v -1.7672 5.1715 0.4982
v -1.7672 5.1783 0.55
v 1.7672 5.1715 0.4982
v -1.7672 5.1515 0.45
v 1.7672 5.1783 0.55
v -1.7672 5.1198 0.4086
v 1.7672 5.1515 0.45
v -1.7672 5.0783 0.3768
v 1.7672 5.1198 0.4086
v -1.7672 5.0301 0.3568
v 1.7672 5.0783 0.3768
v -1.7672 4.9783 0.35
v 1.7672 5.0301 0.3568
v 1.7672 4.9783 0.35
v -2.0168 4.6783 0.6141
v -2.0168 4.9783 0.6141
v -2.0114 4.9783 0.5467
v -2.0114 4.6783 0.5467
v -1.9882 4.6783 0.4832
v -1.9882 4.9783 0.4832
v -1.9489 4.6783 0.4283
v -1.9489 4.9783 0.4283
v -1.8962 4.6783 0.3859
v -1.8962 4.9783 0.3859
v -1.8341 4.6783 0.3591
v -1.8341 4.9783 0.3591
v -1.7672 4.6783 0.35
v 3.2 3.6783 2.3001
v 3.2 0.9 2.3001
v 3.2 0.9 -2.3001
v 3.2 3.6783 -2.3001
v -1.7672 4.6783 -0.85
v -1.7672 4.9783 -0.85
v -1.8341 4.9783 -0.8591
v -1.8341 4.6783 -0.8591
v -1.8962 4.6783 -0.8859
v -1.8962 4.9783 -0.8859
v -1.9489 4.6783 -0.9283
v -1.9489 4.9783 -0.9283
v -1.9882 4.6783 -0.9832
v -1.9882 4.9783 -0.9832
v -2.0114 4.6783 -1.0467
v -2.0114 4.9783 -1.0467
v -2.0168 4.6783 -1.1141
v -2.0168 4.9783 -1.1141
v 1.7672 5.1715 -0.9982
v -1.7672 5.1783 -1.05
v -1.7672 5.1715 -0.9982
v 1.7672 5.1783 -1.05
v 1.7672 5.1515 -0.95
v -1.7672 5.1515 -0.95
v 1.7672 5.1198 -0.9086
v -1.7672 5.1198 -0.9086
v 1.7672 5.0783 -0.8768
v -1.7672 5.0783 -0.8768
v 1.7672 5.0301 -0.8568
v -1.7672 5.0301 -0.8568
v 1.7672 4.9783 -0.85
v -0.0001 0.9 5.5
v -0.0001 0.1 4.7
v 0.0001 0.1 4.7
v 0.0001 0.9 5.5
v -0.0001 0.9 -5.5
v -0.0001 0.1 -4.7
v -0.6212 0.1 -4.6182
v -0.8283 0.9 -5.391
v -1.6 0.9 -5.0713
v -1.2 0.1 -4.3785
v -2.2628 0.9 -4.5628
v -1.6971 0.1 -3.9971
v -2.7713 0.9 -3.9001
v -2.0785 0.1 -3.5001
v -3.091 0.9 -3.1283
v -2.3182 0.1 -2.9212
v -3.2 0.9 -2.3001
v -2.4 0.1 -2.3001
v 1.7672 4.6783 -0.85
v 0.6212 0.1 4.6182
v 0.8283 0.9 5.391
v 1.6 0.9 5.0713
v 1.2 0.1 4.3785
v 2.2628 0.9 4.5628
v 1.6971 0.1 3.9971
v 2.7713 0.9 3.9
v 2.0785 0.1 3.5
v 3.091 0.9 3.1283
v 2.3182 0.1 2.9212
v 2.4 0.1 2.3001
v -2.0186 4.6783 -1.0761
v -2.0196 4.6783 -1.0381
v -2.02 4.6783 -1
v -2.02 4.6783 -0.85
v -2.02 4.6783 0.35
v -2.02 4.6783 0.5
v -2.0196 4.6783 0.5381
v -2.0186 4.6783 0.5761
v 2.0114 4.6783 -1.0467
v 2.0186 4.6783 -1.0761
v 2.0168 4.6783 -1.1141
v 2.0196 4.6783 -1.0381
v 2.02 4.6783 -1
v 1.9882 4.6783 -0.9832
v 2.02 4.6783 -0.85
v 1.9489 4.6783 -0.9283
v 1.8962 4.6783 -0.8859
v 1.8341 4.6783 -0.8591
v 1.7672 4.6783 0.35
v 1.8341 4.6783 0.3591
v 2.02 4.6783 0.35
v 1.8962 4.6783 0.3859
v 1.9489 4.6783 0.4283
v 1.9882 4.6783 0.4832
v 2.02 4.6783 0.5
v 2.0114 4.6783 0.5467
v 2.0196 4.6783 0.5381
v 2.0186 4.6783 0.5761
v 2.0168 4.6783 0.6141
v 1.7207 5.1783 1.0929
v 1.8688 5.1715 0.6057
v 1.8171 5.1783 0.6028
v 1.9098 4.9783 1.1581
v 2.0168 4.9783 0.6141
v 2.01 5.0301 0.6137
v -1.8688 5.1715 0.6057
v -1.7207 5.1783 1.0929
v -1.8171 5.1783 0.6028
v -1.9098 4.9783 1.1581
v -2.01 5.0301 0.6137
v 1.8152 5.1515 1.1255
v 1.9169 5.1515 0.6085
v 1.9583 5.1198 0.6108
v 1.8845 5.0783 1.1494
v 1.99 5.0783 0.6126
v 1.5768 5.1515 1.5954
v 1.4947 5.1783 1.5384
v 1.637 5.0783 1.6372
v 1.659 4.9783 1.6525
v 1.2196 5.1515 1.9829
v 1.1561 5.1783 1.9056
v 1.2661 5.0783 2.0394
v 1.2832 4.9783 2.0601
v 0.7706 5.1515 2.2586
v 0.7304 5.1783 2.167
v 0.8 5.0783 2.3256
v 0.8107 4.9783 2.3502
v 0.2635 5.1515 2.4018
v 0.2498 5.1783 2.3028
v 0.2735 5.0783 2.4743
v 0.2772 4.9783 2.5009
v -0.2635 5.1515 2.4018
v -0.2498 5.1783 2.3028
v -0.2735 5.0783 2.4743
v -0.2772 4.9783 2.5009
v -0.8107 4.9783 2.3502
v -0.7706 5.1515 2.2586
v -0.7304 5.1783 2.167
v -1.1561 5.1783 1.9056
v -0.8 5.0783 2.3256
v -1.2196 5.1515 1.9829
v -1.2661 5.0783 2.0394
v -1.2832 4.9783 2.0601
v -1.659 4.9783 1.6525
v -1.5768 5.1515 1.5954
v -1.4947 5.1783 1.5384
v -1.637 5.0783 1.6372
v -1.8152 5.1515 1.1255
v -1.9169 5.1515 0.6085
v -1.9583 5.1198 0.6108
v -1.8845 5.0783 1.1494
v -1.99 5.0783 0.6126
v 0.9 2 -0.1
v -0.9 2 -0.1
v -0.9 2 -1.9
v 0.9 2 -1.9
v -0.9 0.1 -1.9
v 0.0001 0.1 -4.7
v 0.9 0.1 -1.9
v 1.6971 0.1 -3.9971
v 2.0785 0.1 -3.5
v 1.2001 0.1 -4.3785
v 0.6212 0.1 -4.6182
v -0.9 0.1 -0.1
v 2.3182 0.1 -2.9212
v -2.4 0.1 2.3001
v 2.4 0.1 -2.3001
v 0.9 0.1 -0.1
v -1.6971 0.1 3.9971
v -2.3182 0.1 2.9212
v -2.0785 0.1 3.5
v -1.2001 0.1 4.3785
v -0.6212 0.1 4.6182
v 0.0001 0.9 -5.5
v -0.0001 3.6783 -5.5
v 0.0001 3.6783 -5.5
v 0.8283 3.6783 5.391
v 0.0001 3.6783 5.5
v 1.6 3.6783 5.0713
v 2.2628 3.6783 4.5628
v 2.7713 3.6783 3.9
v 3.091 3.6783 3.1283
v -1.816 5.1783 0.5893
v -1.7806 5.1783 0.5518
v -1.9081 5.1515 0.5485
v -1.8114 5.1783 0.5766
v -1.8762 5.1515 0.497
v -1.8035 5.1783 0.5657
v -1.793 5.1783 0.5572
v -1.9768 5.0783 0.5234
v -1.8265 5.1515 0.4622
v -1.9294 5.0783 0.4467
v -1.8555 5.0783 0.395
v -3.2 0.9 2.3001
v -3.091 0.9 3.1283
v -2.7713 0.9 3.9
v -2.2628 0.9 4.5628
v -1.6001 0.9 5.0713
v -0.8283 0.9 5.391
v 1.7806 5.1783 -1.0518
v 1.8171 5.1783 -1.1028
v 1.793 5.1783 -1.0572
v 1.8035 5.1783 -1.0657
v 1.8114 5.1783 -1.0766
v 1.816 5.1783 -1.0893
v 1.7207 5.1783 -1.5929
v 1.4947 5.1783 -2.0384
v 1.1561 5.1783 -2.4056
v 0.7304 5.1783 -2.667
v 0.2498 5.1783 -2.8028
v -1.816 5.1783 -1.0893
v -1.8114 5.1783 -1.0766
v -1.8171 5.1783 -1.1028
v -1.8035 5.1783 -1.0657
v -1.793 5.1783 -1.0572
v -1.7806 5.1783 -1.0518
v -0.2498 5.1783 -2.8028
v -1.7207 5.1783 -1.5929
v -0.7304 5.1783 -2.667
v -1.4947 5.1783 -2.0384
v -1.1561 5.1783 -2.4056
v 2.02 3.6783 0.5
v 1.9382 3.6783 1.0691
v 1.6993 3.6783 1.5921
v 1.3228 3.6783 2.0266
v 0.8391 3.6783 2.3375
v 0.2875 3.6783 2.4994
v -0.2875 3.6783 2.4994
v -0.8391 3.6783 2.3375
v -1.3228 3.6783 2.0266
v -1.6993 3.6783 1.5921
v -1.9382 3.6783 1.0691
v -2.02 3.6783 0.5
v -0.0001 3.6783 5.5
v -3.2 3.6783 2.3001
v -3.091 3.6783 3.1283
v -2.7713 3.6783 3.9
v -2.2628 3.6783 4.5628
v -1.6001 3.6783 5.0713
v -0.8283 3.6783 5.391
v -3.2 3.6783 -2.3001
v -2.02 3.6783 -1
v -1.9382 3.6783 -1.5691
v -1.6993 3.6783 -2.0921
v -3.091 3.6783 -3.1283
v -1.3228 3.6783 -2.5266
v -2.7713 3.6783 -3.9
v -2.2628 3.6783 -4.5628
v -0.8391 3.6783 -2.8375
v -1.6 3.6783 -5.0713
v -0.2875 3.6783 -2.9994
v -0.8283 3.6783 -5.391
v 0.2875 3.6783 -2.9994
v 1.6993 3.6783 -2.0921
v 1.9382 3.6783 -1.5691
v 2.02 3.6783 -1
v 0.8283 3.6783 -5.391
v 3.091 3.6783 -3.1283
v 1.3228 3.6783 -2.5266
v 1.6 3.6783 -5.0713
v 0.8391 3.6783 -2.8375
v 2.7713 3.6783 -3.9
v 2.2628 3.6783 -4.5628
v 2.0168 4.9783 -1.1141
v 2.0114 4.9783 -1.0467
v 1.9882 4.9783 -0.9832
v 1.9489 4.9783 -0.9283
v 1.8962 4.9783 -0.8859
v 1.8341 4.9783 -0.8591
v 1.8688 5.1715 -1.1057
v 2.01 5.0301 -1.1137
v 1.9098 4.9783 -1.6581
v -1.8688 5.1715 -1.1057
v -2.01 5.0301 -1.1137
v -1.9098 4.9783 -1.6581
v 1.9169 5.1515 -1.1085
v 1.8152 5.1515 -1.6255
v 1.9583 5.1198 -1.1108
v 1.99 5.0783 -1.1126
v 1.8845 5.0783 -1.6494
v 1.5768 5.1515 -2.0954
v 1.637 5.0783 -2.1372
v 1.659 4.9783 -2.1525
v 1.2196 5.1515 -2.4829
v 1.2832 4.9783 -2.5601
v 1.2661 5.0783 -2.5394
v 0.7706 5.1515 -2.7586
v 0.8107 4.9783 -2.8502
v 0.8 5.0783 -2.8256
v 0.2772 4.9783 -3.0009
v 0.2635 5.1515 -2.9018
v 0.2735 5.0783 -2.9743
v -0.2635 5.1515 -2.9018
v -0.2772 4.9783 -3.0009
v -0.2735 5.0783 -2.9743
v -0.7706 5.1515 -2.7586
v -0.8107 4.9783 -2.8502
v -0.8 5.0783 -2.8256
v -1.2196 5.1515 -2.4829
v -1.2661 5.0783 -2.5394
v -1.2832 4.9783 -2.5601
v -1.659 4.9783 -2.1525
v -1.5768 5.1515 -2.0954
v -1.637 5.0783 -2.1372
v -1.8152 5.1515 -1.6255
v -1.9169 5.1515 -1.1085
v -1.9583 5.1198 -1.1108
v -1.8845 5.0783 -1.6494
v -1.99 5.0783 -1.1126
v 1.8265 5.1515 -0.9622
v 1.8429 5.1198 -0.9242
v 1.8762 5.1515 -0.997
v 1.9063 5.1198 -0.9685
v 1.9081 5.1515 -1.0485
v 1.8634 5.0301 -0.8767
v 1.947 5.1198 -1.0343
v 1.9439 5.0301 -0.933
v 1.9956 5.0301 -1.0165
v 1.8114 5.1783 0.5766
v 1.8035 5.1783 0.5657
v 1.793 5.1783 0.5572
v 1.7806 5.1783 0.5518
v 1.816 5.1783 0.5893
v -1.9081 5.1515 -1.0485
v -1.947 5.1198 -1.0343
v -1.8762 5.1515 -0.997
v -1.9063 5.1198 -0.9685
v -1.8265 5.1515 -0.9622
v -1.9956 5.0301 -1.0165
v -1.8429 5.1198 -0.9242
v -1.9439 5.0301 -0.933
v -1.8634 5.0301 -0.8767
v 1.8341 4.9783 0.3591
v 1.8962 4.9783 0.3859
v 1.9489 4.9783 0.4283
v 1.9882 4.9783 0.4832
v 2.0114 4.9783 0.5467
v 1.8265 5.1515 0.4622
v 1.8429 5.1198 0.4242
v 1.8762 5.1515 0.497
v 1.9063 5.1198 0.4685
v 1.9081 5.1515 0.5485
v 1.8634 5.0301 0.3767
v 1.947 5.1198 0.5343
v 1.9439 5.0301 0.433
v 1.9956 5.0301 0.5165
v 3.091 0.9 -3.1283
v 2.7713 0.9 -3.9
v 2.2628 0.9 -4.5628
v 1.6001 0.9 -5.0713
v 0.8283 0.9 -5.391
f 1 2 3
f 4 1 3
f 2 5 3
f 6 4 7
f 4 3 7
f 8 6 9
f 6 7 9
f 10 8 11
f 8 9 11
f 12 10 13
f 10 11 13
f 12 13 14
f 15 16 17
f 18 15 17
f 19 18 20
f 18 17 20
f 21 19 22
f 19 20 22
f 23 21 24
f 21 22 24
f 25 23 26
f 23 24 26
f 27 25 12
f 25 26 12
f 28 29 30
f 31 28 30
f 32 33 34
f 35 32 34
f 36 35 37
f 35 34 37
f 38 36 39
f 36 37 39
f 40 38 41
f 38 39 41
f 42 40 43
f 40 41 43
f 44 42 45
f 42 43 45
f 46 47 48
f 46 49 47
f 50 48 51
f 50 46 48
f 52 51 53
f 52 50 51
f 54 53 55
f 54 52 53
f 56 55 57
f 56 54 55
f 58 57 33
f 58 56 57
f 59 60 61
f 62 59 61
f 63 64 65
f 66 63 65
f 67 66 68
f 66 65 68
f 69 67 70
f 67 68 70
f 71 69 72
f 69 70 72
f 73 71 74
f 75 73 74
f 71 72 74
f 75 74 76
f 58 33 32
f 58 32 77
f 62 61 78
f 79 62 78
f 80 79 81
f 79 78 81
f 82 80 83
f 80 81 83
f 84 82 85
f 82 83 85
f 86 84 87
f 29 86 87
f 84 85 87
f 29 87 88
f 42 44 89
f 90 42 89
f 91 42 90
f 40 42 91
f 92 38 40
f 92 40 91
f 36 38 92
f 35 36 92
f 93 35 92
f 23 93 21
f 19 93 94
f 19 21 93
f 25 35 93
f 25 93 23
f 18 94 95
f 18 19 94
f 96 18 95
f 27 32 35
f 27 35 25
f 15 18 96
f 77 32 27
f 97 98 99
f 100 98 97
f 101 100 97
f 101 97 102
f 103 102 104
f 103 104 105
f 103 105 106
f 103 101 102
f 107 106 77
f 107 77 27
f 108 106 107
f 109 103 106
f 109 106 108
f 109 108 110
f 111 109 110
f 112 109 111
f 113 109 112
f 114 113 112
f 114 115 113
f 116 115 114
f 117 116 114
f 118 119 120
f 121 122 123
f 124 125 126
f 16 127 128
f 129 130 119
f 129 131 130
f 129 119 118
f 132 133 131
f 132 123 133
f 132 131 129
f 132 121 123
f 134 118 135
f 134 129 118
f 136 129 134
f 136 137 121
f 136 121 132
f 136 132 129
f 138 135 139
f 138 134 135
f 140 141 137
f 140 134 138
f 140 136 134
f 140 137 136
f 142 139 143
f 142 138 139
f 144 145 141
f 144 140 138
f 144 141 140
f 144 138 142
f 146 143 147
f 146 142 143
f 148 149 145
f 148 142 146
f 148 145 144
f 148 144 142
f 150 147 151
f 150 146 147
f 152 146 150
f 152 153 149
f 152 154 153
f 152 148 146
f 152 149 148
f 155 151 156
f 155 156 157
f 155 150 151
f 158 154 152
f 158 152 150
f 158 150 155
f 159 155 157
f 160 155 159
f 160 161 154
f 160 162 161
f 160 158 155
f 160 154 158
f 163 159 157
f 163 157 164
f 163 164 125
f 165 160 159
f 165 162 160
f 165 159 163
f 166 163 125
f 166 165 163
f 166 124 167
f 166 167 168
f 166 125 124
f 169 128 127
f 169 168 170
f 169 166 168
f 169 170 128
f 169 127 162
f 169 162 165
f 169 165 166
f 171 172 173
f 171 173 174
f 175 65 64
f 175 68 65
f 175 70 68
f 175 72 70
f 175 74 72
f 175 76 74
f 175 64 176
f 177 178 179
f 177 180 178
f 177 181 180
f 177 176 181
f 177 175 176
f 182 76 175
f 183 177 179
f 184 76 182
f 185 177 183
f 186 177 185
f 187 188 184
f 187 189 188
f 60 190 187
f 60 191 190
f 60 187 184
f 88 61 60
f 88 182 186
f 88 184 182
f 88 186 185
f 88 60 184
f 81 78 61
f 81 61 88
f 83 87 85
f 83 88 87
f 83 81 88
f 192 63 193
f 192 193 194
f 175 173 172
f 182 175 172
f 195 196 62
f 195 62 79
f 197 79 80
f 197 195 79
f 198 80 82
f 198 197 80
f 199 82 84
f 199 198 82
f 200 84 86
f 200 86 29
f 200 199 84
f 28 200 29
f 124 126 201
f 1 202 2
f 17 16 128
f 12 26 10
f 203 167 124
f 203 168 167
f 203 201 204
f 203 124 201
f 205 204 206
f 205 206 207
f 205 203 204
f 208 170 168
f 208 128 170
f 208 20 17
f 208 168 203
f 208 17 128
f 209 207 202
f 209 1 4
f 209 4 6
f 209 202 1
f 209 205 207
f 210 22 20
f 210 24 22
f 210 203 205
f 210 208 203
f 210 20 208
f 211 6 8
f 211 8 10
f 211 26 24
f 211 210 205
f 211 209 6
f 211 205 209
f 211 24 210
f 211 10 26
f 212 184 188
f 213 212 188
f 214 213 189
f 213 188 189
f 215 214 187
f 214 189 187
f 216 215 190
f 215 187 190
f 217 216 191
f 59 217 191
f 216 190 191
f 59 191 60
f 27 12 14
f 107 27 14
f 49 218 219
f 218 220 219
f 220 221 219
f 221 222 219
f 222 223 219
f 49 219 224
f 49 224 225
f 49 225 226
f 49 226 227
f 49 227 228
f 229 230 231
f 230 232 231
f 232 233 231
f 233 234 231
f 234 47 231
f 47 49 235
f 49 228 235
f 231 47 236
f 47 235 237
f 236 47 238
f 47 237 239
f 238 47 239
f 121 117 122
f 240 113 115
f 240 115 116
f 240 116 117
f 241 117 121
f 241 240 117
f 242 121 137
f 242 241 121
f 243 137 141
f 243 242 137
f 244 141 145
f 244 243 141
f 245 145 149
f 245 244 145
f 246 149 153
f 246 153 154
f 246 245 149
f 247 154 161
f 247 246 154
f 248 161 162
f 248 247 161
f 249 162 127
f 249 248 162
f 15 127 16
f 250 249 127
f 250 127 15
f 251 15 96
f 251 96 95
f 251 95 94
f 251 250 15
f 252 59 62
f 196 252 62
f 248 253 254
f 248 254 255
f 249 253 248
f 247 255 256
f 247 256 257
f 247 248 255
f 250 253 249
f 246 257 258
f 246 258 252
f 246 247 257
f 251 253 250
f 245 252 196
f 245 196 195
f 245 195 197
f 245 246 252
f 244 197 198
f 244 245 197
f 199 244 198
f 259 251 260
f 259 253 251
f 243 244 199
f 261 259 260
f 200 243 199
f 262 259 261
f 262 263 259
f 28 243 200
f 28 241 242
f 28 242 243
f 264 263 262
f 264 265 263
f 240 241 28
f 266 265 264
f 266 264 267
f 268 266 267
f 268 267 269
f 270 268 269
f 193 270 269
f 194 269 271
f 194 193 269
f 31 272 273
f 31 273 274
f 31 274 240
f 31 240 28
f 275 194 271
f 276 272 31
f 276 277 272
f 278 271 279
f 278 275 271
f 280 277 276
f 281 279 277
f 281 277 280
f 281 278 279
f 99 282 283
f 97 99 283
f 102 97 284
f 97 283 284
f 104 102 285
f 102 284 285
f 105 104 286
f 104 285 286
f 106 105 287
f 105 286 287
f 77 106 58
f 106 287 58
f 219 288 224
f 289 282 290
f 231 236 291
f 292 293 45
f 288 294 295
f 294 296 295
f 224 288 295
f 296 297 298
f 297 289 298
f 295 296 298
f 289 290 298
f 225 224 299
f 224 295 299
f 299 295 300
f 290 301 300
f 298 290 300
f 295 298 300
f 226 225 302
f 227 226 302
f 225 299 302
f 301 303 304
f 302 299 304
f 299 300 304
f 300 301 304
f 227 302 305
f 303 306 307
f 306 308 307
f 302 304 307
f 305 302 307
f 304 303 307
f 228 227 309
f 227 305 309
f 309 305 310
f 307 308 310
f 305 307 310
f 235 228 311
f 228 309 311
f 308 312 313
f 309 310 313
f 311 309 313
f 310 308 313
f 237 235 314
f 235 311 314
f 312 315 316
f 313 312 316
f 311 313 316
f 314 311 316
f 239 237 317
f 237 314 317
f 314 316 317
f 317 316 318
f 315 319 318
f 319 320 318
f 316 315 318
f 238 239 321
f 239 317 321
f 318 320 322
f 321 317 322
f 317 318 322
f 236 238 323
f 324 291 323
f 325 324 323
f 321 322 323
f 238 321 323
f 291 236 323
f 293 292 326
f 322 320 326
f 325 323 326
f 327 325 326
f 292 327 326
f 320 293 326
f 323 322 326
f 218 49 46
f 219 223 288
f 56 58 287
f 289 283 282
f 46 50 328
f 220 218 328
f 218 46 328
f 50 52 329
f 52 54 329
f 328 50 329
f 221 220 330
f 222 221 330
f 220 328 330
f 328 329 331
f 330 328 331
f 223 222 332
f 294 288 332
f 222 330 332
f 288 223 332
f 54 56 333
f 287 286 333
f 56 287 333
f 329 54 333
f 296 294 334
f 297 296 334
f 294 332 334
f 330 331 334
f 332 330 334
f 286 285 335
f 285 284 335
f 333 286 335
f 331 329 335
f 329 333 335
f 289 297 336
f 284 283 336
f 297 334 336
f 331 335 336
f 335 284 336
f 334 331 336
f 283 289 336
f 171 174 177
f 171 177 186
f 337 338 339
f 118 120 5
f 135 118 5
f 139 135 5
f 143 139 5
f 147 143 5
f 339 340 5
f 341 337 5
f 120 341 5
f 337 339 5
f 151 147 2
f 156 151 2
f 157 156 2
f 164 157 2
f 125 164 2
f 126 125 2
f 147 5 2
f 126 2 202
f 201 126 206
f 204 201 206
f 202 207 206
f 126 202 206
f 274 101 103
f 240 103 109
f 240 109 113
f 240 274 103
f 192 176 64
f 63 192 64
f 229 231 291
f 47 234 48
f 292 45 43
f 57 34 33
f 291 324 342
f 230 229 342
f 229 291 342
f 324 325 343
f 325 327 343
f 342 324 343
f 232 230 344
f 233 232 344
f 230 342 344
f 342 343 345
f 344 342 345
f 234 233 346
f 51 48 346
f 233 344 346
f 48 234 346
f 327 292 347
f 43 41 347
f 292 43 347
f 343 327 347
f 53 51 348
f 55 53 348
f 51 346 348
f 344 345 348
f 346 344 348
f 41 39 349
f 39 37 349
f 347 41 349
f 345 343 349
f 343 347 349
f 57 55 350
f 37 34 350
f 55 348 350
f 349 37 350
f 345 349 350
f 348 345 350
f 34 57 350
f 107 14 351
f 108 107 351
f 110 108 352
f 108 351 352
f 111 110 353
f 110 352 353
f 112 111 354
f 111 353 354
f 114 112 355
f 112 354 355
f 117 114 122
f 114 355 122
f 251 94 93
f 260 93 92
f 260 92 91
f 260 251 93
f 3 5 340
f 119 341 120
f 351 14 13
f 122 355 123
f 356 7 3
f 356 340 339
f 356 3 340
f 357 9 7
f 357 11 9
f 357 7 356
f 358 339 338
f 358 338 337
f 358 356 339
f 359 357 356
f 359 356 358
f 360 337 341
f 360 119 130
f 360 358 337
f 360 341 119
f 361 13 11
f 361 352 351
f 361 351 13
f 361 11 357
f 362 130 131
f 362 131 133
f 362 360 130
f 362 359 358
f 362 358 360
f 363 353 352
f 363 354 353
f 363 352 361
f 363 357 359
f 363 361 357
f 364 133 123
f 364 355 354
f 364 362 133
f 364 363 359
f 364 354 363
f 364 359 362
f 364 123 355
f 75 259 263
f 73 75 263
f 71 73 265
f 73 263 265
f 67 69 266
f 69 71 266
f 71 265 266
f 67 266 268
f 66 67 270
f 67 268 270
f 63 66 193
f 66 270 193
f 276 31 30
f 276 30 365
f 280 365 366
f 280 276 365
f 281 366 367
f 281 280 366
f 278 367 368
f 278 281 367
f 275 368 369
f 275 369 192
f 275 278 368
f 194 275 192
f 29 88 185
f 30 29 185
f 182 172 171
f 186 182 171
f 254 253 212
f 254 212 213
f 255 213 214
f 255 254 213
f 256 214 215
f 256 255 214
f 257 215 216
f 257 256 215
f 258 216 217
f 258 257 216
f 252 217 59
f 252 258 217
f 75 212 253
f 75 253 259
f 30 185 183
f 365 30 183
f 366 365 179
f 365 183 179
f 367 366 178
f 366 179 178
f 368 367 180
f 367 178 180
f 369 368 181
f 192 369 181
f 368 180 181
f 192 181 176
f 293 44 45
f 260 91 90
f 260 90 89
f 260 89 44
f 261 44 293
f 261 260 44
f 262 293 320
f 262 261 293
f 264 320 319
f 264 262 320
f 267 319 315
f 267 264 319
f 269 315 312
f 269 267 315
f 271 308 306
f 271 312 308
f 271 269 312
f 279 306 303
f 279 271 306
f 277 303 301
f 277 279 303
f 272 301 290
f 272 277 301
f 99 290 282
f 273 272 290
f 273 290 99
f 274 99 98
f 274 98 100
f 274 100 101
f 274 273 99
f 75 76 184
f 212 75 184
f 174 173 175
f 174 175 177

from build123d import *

# Parameters (mm, degrees)
SKETCH_1_W              = 6.4
SKETCH_1_H              = 11
EXTRUDE_1_DEPTH         = 3.678333878
FILLET_1_R              = 3.2
EXTRUDE_2_DEPTH         = 1.5
SKETCH_3_W              = 4.04000003
SKETCH_3_H              = 1.2
CUT_EXTRUDE_1_DEPTH     = 0.5
FILLET_2_R              = 0.25
FILLET_3_R              = 0.2
OTHER_2_OUTLINE_W       = 1.5
OTHER_2_OUTLINE_H       = 1.5
OTHER_2_DEPTH           = 2
SKETCH_5_W              = 1.8
SKETCH_5_H              = 1.8
CUT_EXTRUDE_2_DEPTH     = 5.4
CUT_EXTRUDE_START       = -0.1
CUT_EXTRUDE_3_OUTLINE_W = 10
CUT_EXTRUDE_3_OUTLINE_H = 14
CUT_EXTRUDE_3_DEPTH     = 0.1
CHAMFER_1_SIZE          = 0.8


# Read off the part's stored shape, not the designer's step: 压凹2, 切除-拉伸3
# Some blends are built 0.0001 mm under size
with BuildPart() as part:
    # 草图1 → 凸台-拉伸1 (new body)
    with BuildSketch(Plane(origin=(0, 0, 0), x_dir=(1, 0, 0), z_dir=(0, 1, 0))):
        Rectangle(SKETCH_1_W, SKETCH_1_H)
    extrude(amount=EXTRUDE_1_DEPTH)

    # 圆角1
    fillet_1_edges = [part.edges().sort_by_distance(p)[0] for p in [
        (-3.2, 1.839166939, -5.5),
        (3.2, 1.839166939, -5.5),
        (3.2, 1.839166939, 5.5),
        (-3.2, 1.839166939, 5.5),
    ]]
    fillet(fillet_1_edges, radius=FILLET_1_R - 0.0001)  # a hair under: the kernel refuses the full size

    # 草图2 → 凸台-拉伸2 (add)
    with BuildSketch(Plane(origin=(0, 3.678333878, 0), x_dir=(1, 0, 0), z_dir=(0, 1, 0))):
        with BuildLine():
            Line((2.020000015, 1), (2.020000015, -0.5))
            ThreePointArc((2.020000015, -0.5), (0, -2.520000015), (-2.020000015, -0.5))
            Line((-2.020000015, -0.5), (-2.020000015, 1))
            ThreePointArc((-2.020000015, 1), (1.5e-08, 3.02), (2.020000015, 1))
        make_face()
    extrude(amount=EXTRUDE_2_DEPTH)

    # 草图3 → 切除-拉伸1 (cut)
    with BuildSketch(Plane(origin=(0, 5.178333878, 0), x_dir=(1, 0, 0), z_dir=(0, 1, 0))):
        with Locations((0, 0.25)):
            Rectangle(SKETCH_3_W, SKETCH_3_H)
    extrude(amount=-CUT_EXTRUDE_1_DEPTH, mode=Mode.SUBTRACT)

    # 圆角2
    # the kernel refuses this fillet: 0.25 mm, written as the material it takes off along each edge
    with BuildSketch(Plane(origin=(2.020000015, 5.838693877, 0.35), x_dir=(-0.012214651008913897, 0, 0.9999253983676635), z_dir=(0, -1, 0))) as fillet_2_piece_1:
        with BuildLine():
            CenterArc((0.253069545, 0.249754592), FILLET_2_R, 179.300134646, 93.238774214)
            Line((0.003088195, 0.252808255), (-0.02190994, 0.253113621))
            Line((-0.02190994, 0.253113621), (-0.024998135, 0.000305366))
            Line((-0.024998135, 0.000305366), (-0.000305366, -0.024998135))
            ThreePointArc((-0.000305366, -0.024998135), (0.149683443, -0.026830333), (0.265251445, -0.024975459))
            Line((0.265251445, -0.024975459), (0.264143999, 0))
        make_face()
    extrude(amount=1.160359998, mode=Mode.SUBTRACT)
    with BuildSketch(Plane(origin=(2.020000015, 5.838693882, -0.85), x_dir=(-0.012214654567378504, 0, -0.9999253983241949), z_dir=(0, -1, 0))) as fillet_2_piece_2:
        with BuildLine():
            CenterArc((0.253069545, -0.249754592), FILLET_2_R, 87.46109086, 93.238774699)
            Line((0.003088196, -0.252808256), (-0.021909939, -0.253113622))
            Line((-0.021909939, -0.253113622), (-0.024998135, -0.000305366))
            Line((-0.024998135, -0.000305366), (-0.000305366, 0.024998135))
            ThreePointArc((-0.000305366, 0.024998135), (0.149683444, 0.026830333), (0.265251447, 0.024975459))
            Line((0.265251447, 0.024975459), (0.264144001, 0))
        make_face()
    extrude(amount=1.160360003, mode=Mode.SUBTRACT)
    with BuildSketch(Plane(origin=(-2.020000015, 5.838693877, 0.35), x_dir=(0.012214651008913804, 0, 0.9999253983676635), z_dir=(0, -1, 0))) as fillet_2_piece_3:
        with BuildLine():
            CenterArc((0.253069545, -0.249754592), FILLET_2_R, 87.461091141, 93.238774214)
            Line((0.003088195, -0.252808255), (-0.02190994, -0.253113621))
            Line((-0.02190994, -0.253113621), (-0.024998135, -0.000305366))
            Line((-0.024998135, -0.000305366), (-0.000305366, 0.024998135))
            ThreePointArc((-0.000305366, 0.024998135), (0.149683443, 0.026830333), (0.265251445, 0.024975459))
            Line((0.265251445, 0.024975459), (0.264143999, 0))
        make_face()
    extrude(amount=1.160359998, mode=Mode.SUBTRACT)
    with BuildSketch(Plane(origin=(-2.020000015, 5.838693882, -0.85), x_dir=(0.012214654567376798, 0, -0.9999253983241947), z_dir=(0, -1, 0))) as fillet_2_piece_4:
        with BuildLine():
            CenterArc((0.253069545, 0.249754592), FILLET_2_R, 179.300134442, 93.238774699)
            Line((0.003088196, 0.252808256), (-0.021909939, 0.253113622))
            Line((-0.021909939, 0.253113622), (-0.024998135, 0.000305366))
            Line((-0.024998135, 0.000305366), (-0.000305366, -0.024998135))
            ThreePointArc((-0.000305366, -0.024998135), (0.149683444, -0.026830333), (0.265251447, -0.024975459))
            Line((0.265251447, -0.024975459), (0.264144001, 0))
        make_face()
    extrude(amount=1.160360003, mode=Mode.SUBTRACT)

    # 圆角3
    fillet_3_edges = [part.edges().sort_by_distance(p)[0] for p in [
        (0, 5.178333878, 2.520000015),
        (0, 5.178333878, 0.35),
        (-1.948874678, 5.178333878, 0.428289595),
        (1.948874678, 5.178333878, 0.428289595),
        (0, 5.178333878, -0.85),
        (0, 5.178333878, -3.02),
        (-1.948874678, 5.178333878, -0.928289595),
        (1.948874678, 5.178333878, -0.928289595),
    ]]
    fillet(fillet_3_edges, radius=FILLET_3_R)

    # 压凹2 outline → 压凹2 (cut)
    with BuildSketch(Plane(origin=(0, 0, 0), x_dir=(1, 0, 0), z_dir=(0, 1, 0))):
        with Locations((0, 1)):
            Rectangle(OTHER_2_OUTLINE_W, OTHER_2_OUTLINE_H)
    extrude(amount=OTHER_2_DEPTH, mode=Mode.SUBTRACT)

    # 草图5 → 切除-拉伸2 (cut)
    with BuildSketch(Plane.XZ.offset(-2)):
        with Locations((0, -1)):
            Rectangle(SKETCH_5_W, SKETCH_5_H)
    extrude(amount=CUT_EXTRUDE_2_DEPTH, mode=Mode.SUBTRACT)

    # 切除-拉伸3 outline → 切除-拉伸3 (cut)
    with BuildSketch(Plane.XZ.offset(CUT_EXTRUDE_START)):
        Rectangle(CUT_EXTRUDE_3_OUTLINE_W, CUT_EXTRUDE_3_OUTLINE_H)
    extrude(amount=CUT_EXTRUDE_3_DEPTH, mode=Mode.SUBTRACT)

    # 倒角1
    chamfer_1_edges = [part.edges().sort_by_distance(p)[0] for p in [
        (2.262770989, 0.1, 4.562770989),
        (-2.262770989, 0.1, -4.562770989),
        (-2.262770989, 0.1, 4.562770989),
        (3.2, 0.1, 0),
        (2.262770989, 0.1, -4.562770989),
        (-3.2, 0.1, 0),
    ]]
    chamfer(chamfer_1_edges, length=CHAMFER_1_SIZE)


solid = part.part
